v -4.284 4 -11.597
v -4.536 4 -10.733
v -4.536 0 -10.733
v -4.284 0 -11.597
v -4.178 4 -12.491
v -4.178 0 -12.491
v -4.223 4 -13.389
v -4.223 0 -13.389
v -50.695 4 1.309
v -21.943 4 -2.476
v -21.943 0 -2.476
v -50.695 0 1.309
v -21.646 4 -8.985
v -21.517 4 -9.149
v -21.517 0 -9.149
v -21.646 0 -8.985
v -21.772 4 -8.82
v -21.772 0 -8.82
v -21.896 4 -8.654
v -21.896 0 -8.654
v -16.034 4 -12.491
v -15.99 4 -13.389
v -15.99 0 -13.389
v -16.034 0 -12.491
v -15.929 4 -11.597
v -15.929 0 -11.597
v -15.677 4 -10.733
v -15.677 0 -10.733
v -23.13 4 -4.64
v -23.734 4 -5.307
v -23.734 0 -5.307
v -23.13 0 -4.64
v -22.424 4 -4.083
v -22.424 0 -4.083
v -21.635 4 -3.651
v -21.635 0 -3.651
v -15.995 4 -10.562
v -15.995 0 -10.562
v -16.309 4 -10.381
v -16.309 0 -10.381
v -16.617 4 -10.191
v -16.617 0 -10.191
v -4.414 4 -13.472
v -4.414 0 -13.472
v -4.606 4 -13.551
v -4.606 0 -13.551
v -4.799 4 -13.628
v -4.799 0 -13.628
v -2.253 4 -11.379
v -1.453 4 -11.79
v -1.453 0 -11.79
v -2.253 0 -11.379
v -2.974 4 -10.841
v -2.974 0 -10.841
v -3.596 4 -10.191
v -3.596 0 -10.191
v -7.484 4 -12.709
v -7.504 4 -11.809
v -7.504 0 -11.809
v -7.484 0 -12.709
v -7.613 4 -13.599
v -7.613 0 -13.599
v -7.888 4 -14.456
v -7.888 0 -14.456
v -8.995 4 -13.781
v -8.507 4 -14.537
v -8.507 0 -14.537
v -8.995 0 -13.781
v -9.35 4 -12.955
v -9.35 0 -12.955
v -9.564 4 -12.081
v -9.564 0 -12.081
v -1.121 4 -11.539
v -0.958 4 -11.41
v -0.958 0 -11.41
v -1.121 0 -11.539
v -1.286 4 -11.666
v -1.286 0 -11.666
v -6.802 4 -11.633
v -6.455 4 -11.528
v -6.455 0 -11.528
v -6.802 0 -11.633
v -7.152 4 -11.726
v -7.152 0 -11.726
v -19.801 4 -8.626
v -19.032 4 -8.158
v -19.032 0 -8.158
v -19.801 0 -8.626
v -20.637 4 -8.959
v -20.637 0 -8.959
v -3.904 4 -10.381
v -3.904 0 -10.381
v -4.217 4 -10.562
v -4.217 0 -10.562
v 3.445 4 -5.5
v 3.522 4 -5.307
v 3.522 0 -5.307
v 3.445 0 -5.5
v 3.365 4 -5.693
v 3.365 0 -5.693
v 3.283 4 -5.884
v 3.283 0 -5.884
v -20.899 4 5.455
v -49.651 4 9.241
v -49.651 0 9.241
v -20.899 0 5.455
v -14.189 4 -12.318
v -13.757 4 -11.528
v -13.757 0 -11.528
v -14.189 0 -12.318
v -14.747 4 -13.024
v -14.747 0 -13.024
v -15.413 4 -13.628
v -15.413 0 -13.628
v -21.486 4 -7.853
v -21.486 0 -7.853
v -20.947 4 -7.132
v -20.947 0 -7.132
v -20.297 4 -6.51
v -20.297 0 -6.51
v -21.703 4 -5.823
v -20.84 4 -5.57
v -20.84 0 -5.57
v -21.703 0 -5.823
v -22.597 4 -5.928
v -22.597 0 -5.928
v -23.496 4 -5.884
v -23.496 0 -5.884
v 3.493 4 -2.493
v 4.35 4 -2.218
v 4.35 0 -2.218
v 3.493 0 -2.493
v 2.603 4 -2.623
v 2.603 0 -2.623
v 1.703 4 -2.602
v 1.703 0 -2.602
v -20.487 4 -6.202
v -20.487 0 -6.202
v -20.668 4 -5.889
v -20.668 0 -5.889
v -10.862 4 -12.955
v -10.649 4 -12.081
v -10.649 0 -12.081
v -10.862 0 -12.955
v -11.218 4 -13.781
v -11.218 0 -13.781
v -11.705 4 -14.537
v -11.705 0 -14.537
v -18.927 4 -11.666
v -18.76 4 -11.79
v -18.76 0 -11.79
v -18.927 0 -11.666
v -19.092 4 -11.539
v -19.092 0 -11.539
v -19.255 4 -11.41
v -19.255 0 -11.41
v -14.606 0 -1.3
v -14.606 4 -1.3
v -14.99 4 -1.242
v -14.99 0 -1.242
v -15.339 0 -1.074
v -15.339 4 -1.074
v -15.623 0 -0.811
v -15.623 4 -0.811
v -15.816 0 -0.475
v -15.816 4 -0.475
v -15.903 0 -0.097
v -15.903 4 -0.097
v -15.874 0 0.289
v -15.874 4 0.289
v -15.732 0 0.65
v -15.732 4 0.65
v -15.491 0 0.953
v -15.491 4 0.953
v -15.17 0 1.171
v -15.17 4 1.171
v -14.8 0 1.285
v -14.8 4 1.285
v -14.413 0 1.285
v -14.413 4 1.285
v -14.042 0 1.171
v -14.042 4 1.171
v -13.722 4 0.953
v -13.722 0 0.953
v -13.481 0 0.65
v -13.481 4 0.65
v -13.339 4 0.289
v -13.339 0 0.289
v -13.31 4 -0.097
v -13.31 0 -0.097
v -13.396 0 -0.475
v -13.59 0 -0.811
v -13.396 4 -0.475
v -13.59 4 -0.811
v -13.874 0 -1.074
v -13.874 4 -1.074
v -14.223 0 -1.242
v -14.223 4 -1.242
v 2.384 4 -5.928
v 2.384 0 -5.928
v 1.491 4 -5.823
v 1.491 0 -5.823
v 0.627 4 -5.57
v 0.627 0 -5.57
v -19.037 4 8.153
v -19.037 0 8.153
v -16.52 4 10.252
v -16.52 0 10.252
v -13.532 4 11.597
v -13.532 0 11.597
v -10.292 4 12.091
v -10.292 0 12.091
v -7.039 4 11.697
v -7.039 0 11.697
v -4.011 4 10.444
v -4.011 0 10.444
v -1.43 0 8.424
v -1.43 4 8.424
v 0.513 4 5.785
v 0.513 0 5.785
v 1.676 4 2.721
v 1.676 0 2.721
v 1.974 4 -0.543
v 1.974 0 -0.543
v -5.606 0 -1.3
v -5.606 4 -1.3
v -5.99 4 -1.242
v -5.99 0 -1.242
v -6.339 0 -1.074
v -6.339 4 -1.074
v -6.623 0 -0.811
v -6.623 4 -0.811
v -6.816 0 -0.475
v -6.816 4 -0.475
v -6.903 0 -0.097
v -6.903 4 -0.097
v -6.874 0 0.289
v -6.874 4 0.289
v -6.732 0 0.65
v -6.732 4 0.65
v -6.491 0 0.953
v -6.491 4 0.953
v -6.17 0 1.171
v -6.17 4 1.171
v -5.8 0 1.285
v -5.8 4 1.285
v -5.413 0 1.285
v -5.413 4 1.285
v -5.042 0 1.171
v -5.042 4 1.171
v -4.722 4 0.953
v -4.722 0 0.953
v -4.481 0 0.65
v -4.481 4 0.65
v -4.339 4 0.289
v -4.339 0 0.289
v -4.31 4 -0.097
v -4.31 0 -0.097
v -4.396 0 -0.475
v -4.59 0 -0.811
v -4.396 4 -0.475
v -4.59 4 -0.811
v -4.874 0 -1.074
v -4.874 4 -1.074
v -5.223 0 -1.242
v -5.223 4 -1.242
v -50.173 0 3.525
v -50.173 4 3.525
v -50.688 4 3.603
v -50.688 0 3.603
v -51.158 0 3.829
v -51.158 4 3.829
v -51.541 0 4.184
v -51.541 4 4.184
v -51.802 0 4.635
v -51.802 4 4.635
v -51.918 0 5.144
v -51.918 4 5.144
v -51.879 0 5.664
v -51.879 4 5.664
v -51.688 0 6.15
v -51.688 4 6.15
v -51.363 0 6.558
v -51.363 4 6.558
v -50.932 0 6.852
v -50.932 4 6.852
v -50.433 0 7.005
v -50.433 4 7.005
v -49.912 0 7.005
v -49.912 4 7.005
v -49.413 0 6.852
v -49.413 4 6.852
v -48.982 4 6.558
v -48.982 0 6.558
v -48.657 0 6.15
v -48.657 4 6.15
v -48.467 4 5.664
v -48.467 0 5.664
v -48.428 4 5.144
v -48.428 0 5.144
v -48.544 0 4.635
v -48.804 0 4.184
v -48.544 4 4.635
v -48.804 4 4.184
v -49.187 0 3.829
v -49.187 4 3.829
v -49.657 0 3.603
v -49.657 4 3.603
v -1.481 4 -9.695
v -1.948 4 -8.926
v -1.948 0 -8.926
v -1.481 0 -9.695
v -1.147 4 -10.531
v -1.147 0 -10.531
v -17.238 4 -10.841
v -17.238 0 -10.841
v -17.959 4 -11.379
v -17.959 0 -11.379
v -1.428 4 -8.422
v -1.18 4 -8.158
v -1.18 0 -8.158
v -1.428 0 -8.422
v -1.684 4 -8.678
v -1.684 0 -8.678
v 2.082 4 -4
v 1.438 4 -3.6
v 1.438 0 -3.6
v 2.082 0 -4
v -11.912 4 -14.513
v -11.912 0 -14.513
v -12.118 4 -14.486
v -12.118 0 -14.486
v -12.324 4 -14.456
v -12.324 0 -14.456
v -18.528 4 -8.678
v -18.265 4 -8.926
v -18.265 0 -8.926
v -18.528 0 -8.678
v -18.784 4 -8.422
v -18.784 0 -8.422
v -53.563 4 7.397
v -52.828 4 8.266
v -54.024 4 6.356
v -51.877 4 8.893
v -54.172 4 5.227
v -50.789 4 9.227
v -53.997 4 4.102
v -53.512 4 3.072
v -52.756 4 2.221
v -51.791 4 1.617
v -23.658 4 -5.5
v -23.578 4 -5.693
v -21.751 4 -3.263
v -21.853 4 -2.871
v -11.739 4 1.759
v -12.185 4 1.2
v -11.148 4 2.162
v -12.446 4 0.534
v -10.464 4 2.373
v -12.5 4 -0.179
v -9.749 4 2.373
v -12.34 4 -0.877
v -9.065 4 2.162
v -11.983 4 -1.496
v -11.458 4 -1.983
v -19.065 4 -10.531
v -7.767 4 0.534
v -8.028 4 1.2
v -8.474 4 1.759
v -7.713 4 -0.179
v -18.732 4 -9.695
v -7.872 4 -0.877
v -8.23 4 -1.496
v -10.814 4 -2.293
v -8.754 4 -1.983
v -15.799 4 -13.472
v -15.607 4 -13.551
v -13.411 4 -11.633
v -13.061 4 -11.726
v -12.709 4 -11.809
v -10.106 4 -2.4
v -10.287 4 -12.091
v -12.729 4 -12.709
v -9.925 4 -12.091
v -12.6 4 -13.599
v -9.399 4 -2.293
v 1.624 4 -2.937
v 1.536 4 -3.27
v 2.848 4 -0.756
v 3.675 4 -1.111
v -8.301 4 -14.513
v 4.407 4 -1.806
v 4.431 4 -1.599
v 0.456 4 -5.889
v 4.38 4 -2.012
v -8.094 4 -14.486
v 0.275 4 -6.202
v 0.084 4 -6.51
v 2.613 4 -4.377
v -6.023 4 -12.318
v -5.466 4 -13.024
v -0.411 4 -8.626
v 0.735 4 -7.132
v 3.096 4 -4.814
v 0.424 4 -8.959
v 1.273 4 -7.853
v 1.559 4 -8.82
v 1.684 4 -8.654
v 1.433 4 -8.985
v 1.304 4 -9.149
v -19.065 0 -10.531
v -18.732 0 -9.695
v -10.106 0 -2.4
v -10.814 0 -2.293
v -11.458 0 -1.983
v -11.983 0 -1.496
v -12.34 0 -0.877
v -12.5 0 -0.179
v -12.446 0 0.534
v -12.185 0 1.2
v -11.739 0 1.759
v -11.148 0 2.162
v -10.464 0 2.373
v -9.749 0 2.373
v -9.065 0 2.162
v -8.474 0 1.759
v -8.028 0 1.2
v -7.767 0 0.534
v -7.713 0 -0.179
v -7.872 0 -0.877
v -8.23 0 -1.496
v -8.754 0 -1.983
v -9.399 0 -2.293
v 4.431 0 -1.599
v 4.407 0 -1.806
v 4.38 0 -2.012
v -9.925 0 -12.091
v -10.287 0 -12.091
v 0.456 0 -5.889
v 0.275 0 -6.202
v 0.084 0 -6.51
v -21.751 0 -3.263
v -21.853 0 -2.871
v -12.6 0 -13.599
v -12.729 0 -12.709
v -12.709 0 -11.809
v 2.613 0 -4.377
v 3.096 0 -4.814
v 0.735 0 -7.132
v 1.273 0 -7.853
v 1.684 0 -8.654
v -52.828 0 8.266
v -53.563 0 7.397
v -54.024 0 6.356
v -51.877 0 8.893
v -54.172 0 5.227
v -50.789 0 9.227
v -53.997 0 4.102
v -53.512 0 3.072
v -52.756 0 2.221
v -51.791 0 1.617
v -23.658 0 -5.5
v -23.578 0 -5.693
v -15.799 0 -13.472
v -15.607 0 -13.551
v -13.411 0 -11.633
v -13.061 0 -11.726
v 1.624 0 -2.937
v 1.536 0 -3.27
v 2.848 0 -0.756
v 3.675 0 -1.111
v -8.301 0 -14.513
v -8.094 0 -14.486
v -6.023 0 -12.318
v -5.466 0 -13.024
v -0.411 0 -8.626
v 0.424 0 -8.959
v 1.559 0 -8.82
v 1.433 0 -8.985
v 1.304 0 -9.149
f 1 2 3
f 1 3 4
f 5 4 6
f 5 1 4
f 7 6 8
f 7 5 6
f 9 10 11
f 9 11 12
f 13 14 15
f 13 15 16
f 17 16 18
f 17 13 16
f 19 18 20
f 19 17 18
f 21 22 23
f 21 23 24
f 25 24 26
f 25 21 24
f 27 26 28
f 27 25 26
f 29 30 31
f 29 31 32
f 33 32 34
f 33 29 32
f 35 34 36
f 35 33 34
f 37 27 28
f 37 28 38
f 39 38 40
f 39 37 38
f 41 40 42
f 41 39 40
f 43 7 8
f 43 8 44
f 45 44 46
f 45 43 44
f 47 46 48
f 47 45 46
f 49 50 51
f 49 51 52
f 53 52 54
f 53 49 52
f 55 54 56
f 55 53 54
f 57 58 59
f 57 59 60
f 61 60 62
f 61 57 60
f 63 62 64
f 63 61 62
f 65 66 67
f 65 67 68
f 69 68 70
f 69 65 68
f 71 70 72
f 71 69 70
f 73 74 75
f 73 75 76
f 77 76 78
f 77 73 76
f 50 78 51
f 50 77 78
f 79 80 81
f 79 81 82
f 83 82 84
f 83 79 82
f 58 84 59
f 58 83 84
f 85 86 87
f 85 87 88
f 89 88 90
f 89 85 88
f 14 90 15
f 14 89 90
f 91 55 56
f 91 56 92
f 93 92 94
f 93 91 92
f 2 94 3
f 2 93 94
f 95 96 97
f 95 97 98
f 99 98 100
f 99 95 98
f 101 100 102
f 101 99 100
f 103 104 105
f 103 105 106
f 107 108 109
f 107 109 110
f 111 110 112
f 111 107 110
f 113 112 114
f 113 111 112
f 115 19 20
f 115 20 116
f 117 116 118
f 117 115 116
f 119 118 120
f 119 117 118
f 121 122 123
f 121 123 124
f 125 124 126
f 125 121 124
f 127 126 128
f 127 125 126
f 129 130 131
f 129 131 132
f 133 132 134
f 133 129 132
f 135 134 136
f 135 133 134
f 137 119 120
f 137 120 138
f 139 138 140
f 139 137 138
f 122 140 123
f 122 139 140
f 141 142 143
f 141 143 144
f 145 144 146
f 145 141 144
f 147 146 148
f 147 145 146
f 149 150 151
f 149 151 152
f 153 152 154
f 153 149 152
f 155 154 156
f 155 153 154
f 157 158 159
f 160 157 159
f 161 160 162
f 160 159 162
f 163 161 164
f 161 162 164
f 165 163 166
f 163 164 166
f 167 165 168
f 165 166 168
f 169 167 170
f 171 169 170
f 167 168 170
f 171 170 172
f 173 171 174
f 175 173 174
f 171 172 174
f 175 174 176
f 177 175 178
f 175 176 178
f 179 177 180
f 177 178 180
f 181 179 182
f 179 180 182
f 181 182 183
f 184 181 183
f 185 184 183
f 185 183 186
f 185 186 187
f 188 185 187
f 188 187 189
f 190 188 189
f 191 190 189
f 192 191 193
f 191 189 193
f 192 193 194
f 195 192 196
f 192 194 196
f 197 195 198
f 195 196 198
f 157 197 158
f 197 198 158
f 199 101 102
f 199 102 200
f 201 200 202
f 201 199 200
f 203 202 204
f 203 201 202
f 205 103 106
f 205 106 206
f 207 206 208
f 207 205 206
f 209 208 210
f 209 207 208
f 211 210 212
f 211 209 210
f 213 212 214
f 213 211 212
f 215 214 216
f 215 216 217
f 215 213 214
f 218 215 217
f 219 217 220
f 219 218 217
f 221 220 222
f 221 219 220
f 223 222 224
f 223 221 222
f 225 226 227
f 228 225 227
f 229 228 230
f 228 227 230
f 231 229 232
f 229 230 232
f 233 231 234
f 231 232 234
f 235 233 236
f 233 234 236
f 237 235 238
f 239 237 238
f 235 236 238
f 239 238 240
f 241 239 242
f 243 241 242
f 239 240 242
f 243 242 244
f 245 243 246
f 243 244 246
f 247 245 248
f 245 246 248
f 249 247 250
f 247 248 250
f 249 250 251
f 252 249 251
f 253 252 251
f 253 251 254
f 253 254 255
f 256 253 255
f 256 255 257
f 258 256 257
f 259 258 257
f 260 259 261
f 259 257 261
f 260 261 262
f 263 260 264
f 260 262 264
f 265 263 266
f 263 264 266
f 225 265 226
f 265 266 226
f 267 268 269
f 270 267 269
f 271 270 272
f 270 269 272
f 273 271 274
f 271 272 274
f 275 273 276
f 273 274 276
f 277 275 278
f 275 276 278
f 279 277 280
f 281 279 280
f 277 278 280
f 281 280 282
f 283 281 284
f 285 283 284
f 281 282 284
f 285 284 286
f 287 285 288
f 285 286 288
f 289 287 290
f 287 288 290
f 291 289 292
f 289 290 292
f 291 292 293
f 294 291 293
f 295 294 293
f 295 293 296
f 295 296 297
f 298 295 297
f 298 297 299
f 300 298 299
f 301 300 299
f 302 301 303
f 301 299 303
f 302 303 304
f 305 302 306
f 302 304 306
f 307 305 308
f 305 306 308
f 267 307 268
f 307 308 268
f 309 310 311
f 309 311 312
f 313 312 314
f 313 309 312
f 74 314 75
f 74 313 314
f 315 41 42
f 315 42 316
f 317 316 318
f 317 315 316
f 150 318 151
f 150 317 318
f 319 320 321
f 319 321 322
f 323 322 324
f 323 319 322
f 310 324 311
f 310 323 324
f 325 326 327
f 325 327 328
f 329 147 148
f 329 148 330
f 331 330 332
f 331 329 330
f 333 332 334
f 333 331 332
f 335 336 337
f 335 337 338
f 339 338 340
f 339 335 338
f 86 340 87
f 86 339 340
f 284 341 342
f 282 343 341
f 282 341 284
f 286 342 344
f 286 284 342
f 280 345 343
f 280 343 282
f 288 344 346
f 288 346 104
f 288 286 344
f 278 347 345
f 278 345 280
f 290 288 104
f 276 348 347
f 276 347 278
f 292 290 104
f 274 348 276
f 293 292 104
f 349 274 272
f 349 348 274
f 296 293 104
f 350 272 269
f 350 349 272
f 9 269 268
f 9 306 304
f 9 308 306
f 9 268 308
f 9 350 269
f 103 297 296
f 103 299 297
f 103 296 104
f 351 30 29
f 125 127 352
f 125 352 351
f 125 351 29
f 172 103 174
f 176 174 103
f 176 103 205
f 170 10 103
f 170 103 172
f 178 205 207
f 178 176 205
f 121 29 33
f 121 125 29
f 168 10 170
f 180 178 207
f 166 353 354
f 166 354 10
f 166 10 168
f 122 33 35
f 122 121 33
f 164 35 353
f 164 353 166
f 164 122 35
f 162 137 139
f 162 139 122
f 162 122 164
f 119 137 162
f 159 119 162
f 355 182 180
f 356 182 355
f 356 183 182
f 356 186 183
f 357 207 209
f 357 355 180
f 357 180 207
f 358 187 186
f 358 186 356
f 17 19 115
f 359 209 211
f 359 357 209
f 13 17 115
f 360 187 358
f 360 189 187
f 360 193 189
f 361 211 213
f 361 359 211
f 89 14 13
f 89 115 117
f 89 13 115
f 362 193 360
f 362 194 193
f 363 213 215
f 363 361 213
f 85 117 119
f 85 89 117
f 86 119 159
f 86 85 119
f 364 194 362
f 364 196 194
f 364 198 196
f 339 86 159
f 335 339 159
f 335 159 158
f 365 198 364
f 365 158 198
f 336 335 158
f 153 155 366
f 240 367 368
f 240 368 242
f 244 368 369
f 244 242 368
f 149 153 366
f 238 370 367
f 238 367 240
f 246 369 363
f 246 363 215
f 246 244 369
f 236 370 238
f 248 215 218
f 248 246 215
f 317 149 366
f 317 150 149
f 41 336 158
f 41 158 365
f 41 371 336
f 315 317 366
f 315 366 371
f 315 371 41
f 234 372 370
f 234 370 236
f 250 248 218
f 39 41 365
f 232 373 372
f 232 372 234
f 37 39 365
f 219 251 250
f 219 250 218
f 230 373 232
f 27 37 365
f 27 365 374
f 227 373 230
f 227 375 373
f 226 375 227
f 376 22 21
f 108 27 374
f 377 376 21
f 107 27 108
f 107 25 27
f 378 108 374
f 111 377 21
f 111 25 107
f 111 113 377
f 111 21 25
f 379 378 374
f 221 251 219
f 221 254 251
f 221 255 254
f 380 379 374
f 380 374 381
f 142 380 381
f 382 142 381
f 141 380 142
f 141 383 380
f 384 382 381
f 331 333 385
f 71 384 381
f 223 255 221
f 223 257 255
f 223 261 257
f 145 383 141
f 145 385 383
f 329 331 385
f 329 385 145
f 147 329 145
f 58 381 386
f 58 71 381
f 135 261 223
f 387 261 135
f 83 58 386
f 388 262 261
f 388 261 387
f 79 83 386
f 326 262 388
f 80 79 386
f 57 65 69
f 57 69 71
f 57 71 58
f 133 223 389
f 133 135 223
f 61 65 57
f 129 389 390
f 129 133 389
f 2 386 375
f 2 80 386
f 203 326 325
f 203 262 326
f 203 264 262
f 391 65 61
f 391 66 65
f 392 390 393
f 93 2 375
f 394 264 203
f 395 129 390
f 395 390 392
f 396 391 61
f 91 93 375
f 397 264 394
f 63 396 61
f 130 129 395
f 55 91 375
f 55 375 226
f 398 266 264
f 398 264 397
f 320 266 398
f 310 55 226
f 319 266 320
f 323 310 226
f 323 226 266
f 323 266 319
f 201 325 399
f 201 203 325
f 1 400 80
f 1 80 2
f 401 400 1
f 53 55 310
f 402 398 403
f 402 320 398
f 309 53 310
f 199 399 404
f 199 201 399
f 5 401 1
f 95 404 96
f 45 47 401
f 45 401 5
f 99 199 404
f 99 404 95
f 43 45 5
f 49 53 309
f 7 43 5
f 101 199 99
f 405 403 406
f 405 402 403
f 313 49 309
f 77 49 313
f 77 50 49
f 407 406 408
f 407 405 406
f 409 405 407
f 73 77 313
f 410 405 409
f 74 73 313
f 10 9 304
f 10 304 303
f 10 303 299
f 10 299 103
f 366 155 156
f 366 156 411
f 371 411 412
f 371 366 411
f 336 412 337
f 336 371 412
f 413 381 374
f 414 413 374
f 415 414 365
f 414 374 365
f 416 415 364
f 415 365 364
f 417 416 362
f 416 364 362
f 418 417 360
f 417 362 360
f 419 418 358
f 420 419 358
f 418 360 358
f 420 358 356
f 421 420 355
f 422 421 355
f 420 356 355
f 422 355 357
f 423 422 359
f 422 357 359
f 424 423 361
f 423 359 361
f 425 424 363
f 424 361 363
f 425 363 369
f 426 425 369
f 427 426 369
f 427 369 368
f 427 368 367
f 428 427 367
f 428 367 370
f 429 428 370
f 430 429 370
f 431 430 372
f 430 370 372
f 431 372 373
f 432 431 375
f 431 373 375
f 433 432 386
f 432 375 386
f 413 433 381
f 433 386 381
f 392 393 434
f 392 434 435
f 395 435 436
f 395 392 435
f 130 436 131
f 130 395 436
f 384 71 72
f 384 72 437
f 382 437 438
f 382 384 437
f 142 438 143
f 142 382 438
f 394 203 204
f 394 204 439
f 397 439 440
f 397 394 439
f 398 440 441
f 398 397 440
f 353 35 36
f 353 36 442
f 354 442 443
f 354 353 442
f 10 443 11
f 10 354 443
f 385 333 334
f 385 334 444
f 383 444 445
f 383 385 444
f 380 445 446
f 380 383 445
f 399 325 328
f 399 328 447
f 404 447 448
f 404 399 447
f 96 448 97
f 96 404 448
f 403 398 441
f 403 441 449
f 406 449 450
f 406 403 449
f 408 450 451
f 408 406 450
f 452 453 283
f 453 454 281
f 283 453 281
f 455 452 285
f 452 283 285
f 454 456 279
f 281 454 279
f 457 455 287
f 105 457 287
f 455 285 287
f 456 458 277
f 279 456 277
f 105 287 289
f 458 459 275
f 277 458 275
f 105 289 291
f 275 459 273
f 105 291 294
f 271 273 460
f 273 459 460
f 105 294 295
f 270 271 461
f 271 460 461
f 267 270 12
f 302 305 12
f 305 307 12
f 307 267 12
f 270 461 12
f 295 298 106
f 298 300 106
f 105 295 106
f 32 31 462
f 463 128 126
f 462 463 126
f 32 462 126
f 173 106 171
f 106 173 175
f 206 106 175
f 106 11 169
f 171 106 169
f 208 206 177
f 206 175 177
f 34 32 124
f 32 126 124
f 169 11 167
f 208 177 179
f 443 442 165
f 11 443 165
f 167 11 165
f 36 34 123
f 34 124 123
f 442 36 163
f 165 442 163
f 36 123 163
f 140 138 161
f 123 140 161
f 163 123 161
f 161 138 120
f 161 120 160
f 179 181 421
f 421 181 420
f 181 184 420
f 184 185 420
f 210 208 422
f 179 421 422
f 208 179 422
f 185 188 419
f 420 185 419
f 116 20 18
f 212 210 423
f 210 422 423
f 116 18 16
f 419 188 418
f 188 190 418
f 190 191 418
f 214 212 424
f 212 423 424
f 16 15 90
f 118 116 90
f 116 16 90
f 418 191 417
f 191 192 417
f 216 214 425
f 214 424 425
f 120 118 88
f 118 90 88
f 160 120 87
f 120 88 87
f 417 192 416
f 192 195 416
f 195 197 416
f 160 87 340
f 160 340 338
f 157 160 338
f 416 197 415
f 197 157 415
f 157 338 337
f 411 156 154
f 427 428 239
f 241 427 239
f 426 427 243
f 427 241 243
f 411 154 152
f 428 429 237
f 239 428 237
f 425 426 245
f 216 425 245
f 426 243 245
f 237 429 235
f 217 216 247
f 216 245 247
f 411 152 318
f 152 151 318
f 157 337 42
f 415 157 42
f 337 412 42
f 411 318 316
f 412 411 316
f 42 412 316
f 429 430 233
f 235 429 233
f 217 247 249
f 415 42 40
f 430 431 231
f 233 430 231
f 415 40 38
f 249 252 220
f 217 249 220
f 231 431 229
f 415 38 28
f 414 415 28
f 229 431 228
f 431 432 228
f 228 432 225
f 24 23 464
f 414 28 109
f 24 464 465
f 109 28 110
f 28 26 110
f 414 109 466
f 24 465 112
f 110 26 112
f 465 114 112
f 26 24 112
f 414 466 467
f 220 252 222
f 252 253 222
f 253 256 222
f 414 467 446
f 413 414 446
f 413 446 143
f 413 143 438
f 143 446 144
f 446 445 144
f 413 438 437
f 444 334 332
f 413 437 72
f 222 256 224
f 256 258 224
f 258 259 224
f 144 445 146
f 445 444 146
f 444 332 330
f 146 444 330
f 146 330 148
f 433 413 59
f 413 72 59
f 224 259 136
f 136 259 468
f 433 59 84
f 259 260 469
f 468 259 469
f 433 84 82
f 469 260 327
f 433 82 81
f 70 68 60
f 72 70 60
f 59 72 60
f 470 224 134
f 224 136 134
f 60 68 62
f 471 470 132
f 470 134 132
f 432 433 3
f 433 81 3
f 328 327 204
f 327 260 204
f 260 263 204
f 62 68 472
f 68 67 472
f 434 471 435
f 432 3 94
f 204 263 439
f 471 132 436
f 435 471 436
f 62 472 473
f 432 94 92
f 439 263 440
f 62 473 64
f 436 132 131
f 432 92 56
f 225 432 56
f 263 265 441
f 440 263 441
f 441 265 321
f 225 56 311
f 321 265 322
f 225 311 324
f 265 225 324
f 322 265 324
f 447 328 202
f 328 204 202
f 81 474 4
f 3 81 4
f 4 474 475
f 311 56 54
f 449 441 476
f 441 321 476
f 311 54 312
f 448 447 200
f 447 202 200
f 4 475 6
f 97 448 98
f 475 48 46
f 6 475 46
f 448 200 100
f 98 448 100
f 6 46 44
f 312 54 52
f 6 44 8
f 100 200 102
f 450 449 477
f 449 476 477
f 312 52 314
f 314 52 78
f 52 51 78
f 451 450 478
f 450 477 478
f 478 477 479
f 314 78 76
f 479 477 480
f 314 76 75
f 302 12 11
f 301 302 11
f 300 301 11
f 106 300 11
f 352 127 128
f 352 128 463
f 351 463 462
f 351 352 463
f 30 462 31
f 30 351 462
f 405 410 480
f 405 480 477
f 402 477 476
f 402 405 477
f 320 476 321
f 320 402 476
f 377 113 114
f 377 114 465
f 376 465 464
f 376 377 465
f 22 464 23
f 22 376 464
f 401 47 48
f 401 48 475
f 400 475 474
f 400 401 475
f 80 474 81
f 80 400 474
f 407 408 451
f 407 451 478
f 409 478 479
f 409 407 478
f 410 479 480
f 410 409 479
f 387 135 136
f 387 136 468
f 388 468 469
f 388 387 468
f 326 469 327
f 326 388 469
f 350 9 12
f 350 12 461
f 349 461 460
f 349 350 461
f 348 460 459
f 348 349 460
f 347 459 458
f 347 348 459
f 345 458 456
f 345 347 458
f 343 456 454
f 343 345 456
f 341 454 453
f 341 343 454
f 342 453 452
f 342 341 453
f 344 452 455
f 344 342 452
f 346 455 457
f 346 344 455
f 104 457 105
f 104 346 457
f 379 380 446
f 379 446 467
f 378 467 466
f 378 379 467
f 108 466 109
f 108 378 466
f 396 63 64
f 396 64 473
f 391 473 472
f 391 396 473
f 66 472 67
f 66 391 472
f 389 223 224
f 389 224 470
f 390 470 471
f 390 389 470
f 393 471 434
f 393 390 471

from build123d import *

# Parameters (mm, degrees)
SKETCH1_R           = 1.75
SKETCH1_R_2         = 2.4
SKETCH1_R_3         = 1.3
BOSS_EXTRUDE1_DEPTH = 4


with BuildPart() as part:
    # Sketch1 → Boss-Extrude1 (new body)
    with BuildSketch(Plane(origin=(0, 4, 0), x_dir=(1, 0, 0), z_dir=(0, 1, 0))):
        with BuildLine():
            Line((1.43808022, 3.600125745), (2.081641936, 4))
            ThreePointArc((2.081641936, 4), (2.861028333, 4.588201733), (3.521749436, 5.30713988))
            ThreePointArc((3.521749436, 5.30713988), (3.405395609, 5.596745198), (3.282888305, 5.883801663))
            ThreePointArc((3.282888305, 5.883801663), (1.93527598, 5.894040025), (0.627094961, 5.57027124))
            ThreePointArc((0.627094961, 5.57027124), (0.366286148, 6.046375), (0.084372603, 6.510293938))
            ThreePointArc((0.084372603, 6.510293938), (1.018855105, 7.48132754), (1.683794586, 8.65351323))
            ThreePointArc((1.683794586, 8.65351323), (1.496450048, 8.903135899), (1.303821399, 9.148703928))
            ThreePointArc((1.303821399, 9.148703928), (-0.000522033, 8.809805691), (-1.180330337, 8.158486898))
            ThreePointArc((-1.180330337, 8.158486898), (-1.555477026, 8.550865528), (-1.947855656, 8.926012217))
            ThreePointArc((-1.947855656, 8.926012217), (-1.296536862, 10.105820521), (-0.957638625, 11.410163953))
            ThreePointArc((-0.957638625, 11.410163953), (-1.203206655, 11.602792602), (-1.452829324, 11.79013714))
            ThreePointArc((-1.452829324, 11.79013714), (-2.625015014, 11.125197659), (-3.596048616, 10.190715157))
            ThreePointArc((-3.596048616, 10.190715157), (-4.059967554, 10.472628702), (-4.536071314, 10.733437515))
            ThreePointArc((-4.536071314, 10.733437515), (-4.212302529, 12.041618533), (-4.222540891, 13.389230859))
            ThreePointArc((-4.222540891, 13.389230859), (-4.509597355, 13.511738163), (-4.799202674, 13.62809199))
            ThreePointArc((-4.799202674, 13.62809199), (-5.759348103, 12.682425791), (-6.455432668, 11.528463019))
            ThreePointArc((-6.455432668, 11.528463019), (-6.976508546, 11.680699536), (-7.503891752, 11.809396783))
            ThreePointArc((-7.503891752, 11.809396783), (-7.529737283, 13.156800143), (-7.888414517, 14.455843809))
            ThreePointArc((-7.888414517, 14.455843809), (-8.197396993, 14.499881098), (-8.507248835, 14.537314892))
            ThreePointArc((-8.507248835, 14.537314892), (-9.18992168, 13.375367565), (-9.563620196, 12.080565177))
            ThreePointArc((-9.563620196, 12.080565177), (-10.106342554, 12.09275), (-10.649064912, 12.080565177))
            ThreePointArc((-10.649064912, 12.080565177), (-11.022763428, 13.375367565), (-11.705436272, 14.537314892))
            ThreePointArc((-11.705436272, 14.537314892), (-12.015288115, 14.499881098), (-12.324270591, 14.455843809))
            ThreePointArc((-12.324270591, 14.455843809), (-12.682947825, 13.156800143), (-12.708793355, 11.809396783))
            ThreePointArc((-12.708793355, 11.809396783), (-13.236176561, 11.680699536), (-13.757252439, 11.528463019))
            ThreePointArc((-13.757252439, 11.528463019), (-14.453337005, 12.682425791), (-15.413482434, 13.62809199))
            ThreePointArc((-15.413482434, 13.62809199), (-15.703087752, 13.511738163), (-15.990144217, 13.389230859))
            ThreePointArc((-15.990144217, 13.389230859), (-16.000382579, 12.041618533), (-15.676613793, 10.733437515))
            ThreePointArc((-15.676613793, 10.733437515), (-16.152717554, 10.472628702), (-16.616636492, 10.190715157))
            ThreePointArc((-16.616636492, 10.190715157), (-17.587670094, 11.125197659), (-18.759855783, 11.79013714))
            ThreePointArc((-18.759855783, 11.79013714), (-19.009478453, 11.602792602), (-19.255046482, 11.410163953))
            ThreePointArc((-19.255046482, 11.410163953), (-18.916148245, 10.105820521), (-18.264829452, 8.926012217))
            ThreePointArc((-18.264829452, 8.926012217), (-18.657208082, 8.550865528), (-19.032354771, 8.158486898))
            ThreePointArc((-19.032354771, 8.158486898), (-20.212163074, 8.809805691), (-21.516506507, 9.148703928))
            ThreePointArc((-21.516506507, 9.148703928), (-21.709135156, 8.903135899), (-21.896479694, 8.65351323))
            ThreePointArc((-21.896479694, 8.65351323), (-21.231540213, 7.48132754), (-20.297057711, 6.510293938))
            ThreePointArc((-20.297057711, 6.510293938), (-20.578971255, 6.046375), (-20.839780068, 5.57027124))
            ThreePointArc((-20.839780068, 5.57027124), (-22.147961087, 5.894040025), (-23.495573413, 5.883801663))
            ThreePointArc((-23.495573413, 5.883801663), (-23.618080717, 5.596745198), (-23.734434544, 5.30713988))
            ThreePointArc((-23.734434544, 5.30713988), (-22.788768345, 4.346994451), (-21.634805572, 3.650909885))
            ThreePointArc((-21.634805572, 3.650909885), (-21.803584999, 3.067429176), (-21.942853375, 2.47620963))
            Line((-21.942853375, 2.47620963), (-50.694754355, -1.309049944))
            ThreePointArc((-50.694754355, -1.309049944), (-54.138429032, -5.796934159), (-49.650544818, -9.240608835))
            Line((-49.650544818, -9.240608835), (-20.898643838, -5.455349261))
            ThreePointArc((-20.898643838, -5.455349261), (-7.038913378, -11.697242445), (1.974222624, 0.542722358))
            ThreePointArc((1.974222624, 0.542722358), (3.269025011, 0.916420874), (4.430972339, 1.599093719))
            ThreePointArc((4.430972339, 1.599093719), (4.393538544, 1.908945561), (4.349501255, 2.217928037))
            ThreePointArc((4.349501255, 2.217928037), (3.050457589, 2.576605271), (1.70305423, 2.602450802))
            ThreePointArc((1.70305423, 2.602450802), (1.581217534, 3.104116905), (1.43808022, 3.600125745))
        make_face()
        with Locations(Location((-50.172649586, -5.27482939, 0), (0, 0, 90))):
            Circle(SKETCH1_R, mode=Mode.SUBTRACT)
        with Locations(Location((-10.106342554, 0, 0), (0, 0, 90))):
            Circle(SKETCH1_R_2, mode=Mode.SUBTRACT)
        with Locations(Location((-5.606342554, 0, 0), (0, 0, 90))):
            Circle(SKETCH1_R_3, mode=Mode.SUBTRACT)
        with Locations(Location((-14.606342554, 0, 0), (0, 0, 90))):
            Circle(SKETCH1_R_3, mode=Mode.SUBTRACT)
    extrude(amount=-BOSS_EXTRUDE1_DEPTH)


solid = part.part
